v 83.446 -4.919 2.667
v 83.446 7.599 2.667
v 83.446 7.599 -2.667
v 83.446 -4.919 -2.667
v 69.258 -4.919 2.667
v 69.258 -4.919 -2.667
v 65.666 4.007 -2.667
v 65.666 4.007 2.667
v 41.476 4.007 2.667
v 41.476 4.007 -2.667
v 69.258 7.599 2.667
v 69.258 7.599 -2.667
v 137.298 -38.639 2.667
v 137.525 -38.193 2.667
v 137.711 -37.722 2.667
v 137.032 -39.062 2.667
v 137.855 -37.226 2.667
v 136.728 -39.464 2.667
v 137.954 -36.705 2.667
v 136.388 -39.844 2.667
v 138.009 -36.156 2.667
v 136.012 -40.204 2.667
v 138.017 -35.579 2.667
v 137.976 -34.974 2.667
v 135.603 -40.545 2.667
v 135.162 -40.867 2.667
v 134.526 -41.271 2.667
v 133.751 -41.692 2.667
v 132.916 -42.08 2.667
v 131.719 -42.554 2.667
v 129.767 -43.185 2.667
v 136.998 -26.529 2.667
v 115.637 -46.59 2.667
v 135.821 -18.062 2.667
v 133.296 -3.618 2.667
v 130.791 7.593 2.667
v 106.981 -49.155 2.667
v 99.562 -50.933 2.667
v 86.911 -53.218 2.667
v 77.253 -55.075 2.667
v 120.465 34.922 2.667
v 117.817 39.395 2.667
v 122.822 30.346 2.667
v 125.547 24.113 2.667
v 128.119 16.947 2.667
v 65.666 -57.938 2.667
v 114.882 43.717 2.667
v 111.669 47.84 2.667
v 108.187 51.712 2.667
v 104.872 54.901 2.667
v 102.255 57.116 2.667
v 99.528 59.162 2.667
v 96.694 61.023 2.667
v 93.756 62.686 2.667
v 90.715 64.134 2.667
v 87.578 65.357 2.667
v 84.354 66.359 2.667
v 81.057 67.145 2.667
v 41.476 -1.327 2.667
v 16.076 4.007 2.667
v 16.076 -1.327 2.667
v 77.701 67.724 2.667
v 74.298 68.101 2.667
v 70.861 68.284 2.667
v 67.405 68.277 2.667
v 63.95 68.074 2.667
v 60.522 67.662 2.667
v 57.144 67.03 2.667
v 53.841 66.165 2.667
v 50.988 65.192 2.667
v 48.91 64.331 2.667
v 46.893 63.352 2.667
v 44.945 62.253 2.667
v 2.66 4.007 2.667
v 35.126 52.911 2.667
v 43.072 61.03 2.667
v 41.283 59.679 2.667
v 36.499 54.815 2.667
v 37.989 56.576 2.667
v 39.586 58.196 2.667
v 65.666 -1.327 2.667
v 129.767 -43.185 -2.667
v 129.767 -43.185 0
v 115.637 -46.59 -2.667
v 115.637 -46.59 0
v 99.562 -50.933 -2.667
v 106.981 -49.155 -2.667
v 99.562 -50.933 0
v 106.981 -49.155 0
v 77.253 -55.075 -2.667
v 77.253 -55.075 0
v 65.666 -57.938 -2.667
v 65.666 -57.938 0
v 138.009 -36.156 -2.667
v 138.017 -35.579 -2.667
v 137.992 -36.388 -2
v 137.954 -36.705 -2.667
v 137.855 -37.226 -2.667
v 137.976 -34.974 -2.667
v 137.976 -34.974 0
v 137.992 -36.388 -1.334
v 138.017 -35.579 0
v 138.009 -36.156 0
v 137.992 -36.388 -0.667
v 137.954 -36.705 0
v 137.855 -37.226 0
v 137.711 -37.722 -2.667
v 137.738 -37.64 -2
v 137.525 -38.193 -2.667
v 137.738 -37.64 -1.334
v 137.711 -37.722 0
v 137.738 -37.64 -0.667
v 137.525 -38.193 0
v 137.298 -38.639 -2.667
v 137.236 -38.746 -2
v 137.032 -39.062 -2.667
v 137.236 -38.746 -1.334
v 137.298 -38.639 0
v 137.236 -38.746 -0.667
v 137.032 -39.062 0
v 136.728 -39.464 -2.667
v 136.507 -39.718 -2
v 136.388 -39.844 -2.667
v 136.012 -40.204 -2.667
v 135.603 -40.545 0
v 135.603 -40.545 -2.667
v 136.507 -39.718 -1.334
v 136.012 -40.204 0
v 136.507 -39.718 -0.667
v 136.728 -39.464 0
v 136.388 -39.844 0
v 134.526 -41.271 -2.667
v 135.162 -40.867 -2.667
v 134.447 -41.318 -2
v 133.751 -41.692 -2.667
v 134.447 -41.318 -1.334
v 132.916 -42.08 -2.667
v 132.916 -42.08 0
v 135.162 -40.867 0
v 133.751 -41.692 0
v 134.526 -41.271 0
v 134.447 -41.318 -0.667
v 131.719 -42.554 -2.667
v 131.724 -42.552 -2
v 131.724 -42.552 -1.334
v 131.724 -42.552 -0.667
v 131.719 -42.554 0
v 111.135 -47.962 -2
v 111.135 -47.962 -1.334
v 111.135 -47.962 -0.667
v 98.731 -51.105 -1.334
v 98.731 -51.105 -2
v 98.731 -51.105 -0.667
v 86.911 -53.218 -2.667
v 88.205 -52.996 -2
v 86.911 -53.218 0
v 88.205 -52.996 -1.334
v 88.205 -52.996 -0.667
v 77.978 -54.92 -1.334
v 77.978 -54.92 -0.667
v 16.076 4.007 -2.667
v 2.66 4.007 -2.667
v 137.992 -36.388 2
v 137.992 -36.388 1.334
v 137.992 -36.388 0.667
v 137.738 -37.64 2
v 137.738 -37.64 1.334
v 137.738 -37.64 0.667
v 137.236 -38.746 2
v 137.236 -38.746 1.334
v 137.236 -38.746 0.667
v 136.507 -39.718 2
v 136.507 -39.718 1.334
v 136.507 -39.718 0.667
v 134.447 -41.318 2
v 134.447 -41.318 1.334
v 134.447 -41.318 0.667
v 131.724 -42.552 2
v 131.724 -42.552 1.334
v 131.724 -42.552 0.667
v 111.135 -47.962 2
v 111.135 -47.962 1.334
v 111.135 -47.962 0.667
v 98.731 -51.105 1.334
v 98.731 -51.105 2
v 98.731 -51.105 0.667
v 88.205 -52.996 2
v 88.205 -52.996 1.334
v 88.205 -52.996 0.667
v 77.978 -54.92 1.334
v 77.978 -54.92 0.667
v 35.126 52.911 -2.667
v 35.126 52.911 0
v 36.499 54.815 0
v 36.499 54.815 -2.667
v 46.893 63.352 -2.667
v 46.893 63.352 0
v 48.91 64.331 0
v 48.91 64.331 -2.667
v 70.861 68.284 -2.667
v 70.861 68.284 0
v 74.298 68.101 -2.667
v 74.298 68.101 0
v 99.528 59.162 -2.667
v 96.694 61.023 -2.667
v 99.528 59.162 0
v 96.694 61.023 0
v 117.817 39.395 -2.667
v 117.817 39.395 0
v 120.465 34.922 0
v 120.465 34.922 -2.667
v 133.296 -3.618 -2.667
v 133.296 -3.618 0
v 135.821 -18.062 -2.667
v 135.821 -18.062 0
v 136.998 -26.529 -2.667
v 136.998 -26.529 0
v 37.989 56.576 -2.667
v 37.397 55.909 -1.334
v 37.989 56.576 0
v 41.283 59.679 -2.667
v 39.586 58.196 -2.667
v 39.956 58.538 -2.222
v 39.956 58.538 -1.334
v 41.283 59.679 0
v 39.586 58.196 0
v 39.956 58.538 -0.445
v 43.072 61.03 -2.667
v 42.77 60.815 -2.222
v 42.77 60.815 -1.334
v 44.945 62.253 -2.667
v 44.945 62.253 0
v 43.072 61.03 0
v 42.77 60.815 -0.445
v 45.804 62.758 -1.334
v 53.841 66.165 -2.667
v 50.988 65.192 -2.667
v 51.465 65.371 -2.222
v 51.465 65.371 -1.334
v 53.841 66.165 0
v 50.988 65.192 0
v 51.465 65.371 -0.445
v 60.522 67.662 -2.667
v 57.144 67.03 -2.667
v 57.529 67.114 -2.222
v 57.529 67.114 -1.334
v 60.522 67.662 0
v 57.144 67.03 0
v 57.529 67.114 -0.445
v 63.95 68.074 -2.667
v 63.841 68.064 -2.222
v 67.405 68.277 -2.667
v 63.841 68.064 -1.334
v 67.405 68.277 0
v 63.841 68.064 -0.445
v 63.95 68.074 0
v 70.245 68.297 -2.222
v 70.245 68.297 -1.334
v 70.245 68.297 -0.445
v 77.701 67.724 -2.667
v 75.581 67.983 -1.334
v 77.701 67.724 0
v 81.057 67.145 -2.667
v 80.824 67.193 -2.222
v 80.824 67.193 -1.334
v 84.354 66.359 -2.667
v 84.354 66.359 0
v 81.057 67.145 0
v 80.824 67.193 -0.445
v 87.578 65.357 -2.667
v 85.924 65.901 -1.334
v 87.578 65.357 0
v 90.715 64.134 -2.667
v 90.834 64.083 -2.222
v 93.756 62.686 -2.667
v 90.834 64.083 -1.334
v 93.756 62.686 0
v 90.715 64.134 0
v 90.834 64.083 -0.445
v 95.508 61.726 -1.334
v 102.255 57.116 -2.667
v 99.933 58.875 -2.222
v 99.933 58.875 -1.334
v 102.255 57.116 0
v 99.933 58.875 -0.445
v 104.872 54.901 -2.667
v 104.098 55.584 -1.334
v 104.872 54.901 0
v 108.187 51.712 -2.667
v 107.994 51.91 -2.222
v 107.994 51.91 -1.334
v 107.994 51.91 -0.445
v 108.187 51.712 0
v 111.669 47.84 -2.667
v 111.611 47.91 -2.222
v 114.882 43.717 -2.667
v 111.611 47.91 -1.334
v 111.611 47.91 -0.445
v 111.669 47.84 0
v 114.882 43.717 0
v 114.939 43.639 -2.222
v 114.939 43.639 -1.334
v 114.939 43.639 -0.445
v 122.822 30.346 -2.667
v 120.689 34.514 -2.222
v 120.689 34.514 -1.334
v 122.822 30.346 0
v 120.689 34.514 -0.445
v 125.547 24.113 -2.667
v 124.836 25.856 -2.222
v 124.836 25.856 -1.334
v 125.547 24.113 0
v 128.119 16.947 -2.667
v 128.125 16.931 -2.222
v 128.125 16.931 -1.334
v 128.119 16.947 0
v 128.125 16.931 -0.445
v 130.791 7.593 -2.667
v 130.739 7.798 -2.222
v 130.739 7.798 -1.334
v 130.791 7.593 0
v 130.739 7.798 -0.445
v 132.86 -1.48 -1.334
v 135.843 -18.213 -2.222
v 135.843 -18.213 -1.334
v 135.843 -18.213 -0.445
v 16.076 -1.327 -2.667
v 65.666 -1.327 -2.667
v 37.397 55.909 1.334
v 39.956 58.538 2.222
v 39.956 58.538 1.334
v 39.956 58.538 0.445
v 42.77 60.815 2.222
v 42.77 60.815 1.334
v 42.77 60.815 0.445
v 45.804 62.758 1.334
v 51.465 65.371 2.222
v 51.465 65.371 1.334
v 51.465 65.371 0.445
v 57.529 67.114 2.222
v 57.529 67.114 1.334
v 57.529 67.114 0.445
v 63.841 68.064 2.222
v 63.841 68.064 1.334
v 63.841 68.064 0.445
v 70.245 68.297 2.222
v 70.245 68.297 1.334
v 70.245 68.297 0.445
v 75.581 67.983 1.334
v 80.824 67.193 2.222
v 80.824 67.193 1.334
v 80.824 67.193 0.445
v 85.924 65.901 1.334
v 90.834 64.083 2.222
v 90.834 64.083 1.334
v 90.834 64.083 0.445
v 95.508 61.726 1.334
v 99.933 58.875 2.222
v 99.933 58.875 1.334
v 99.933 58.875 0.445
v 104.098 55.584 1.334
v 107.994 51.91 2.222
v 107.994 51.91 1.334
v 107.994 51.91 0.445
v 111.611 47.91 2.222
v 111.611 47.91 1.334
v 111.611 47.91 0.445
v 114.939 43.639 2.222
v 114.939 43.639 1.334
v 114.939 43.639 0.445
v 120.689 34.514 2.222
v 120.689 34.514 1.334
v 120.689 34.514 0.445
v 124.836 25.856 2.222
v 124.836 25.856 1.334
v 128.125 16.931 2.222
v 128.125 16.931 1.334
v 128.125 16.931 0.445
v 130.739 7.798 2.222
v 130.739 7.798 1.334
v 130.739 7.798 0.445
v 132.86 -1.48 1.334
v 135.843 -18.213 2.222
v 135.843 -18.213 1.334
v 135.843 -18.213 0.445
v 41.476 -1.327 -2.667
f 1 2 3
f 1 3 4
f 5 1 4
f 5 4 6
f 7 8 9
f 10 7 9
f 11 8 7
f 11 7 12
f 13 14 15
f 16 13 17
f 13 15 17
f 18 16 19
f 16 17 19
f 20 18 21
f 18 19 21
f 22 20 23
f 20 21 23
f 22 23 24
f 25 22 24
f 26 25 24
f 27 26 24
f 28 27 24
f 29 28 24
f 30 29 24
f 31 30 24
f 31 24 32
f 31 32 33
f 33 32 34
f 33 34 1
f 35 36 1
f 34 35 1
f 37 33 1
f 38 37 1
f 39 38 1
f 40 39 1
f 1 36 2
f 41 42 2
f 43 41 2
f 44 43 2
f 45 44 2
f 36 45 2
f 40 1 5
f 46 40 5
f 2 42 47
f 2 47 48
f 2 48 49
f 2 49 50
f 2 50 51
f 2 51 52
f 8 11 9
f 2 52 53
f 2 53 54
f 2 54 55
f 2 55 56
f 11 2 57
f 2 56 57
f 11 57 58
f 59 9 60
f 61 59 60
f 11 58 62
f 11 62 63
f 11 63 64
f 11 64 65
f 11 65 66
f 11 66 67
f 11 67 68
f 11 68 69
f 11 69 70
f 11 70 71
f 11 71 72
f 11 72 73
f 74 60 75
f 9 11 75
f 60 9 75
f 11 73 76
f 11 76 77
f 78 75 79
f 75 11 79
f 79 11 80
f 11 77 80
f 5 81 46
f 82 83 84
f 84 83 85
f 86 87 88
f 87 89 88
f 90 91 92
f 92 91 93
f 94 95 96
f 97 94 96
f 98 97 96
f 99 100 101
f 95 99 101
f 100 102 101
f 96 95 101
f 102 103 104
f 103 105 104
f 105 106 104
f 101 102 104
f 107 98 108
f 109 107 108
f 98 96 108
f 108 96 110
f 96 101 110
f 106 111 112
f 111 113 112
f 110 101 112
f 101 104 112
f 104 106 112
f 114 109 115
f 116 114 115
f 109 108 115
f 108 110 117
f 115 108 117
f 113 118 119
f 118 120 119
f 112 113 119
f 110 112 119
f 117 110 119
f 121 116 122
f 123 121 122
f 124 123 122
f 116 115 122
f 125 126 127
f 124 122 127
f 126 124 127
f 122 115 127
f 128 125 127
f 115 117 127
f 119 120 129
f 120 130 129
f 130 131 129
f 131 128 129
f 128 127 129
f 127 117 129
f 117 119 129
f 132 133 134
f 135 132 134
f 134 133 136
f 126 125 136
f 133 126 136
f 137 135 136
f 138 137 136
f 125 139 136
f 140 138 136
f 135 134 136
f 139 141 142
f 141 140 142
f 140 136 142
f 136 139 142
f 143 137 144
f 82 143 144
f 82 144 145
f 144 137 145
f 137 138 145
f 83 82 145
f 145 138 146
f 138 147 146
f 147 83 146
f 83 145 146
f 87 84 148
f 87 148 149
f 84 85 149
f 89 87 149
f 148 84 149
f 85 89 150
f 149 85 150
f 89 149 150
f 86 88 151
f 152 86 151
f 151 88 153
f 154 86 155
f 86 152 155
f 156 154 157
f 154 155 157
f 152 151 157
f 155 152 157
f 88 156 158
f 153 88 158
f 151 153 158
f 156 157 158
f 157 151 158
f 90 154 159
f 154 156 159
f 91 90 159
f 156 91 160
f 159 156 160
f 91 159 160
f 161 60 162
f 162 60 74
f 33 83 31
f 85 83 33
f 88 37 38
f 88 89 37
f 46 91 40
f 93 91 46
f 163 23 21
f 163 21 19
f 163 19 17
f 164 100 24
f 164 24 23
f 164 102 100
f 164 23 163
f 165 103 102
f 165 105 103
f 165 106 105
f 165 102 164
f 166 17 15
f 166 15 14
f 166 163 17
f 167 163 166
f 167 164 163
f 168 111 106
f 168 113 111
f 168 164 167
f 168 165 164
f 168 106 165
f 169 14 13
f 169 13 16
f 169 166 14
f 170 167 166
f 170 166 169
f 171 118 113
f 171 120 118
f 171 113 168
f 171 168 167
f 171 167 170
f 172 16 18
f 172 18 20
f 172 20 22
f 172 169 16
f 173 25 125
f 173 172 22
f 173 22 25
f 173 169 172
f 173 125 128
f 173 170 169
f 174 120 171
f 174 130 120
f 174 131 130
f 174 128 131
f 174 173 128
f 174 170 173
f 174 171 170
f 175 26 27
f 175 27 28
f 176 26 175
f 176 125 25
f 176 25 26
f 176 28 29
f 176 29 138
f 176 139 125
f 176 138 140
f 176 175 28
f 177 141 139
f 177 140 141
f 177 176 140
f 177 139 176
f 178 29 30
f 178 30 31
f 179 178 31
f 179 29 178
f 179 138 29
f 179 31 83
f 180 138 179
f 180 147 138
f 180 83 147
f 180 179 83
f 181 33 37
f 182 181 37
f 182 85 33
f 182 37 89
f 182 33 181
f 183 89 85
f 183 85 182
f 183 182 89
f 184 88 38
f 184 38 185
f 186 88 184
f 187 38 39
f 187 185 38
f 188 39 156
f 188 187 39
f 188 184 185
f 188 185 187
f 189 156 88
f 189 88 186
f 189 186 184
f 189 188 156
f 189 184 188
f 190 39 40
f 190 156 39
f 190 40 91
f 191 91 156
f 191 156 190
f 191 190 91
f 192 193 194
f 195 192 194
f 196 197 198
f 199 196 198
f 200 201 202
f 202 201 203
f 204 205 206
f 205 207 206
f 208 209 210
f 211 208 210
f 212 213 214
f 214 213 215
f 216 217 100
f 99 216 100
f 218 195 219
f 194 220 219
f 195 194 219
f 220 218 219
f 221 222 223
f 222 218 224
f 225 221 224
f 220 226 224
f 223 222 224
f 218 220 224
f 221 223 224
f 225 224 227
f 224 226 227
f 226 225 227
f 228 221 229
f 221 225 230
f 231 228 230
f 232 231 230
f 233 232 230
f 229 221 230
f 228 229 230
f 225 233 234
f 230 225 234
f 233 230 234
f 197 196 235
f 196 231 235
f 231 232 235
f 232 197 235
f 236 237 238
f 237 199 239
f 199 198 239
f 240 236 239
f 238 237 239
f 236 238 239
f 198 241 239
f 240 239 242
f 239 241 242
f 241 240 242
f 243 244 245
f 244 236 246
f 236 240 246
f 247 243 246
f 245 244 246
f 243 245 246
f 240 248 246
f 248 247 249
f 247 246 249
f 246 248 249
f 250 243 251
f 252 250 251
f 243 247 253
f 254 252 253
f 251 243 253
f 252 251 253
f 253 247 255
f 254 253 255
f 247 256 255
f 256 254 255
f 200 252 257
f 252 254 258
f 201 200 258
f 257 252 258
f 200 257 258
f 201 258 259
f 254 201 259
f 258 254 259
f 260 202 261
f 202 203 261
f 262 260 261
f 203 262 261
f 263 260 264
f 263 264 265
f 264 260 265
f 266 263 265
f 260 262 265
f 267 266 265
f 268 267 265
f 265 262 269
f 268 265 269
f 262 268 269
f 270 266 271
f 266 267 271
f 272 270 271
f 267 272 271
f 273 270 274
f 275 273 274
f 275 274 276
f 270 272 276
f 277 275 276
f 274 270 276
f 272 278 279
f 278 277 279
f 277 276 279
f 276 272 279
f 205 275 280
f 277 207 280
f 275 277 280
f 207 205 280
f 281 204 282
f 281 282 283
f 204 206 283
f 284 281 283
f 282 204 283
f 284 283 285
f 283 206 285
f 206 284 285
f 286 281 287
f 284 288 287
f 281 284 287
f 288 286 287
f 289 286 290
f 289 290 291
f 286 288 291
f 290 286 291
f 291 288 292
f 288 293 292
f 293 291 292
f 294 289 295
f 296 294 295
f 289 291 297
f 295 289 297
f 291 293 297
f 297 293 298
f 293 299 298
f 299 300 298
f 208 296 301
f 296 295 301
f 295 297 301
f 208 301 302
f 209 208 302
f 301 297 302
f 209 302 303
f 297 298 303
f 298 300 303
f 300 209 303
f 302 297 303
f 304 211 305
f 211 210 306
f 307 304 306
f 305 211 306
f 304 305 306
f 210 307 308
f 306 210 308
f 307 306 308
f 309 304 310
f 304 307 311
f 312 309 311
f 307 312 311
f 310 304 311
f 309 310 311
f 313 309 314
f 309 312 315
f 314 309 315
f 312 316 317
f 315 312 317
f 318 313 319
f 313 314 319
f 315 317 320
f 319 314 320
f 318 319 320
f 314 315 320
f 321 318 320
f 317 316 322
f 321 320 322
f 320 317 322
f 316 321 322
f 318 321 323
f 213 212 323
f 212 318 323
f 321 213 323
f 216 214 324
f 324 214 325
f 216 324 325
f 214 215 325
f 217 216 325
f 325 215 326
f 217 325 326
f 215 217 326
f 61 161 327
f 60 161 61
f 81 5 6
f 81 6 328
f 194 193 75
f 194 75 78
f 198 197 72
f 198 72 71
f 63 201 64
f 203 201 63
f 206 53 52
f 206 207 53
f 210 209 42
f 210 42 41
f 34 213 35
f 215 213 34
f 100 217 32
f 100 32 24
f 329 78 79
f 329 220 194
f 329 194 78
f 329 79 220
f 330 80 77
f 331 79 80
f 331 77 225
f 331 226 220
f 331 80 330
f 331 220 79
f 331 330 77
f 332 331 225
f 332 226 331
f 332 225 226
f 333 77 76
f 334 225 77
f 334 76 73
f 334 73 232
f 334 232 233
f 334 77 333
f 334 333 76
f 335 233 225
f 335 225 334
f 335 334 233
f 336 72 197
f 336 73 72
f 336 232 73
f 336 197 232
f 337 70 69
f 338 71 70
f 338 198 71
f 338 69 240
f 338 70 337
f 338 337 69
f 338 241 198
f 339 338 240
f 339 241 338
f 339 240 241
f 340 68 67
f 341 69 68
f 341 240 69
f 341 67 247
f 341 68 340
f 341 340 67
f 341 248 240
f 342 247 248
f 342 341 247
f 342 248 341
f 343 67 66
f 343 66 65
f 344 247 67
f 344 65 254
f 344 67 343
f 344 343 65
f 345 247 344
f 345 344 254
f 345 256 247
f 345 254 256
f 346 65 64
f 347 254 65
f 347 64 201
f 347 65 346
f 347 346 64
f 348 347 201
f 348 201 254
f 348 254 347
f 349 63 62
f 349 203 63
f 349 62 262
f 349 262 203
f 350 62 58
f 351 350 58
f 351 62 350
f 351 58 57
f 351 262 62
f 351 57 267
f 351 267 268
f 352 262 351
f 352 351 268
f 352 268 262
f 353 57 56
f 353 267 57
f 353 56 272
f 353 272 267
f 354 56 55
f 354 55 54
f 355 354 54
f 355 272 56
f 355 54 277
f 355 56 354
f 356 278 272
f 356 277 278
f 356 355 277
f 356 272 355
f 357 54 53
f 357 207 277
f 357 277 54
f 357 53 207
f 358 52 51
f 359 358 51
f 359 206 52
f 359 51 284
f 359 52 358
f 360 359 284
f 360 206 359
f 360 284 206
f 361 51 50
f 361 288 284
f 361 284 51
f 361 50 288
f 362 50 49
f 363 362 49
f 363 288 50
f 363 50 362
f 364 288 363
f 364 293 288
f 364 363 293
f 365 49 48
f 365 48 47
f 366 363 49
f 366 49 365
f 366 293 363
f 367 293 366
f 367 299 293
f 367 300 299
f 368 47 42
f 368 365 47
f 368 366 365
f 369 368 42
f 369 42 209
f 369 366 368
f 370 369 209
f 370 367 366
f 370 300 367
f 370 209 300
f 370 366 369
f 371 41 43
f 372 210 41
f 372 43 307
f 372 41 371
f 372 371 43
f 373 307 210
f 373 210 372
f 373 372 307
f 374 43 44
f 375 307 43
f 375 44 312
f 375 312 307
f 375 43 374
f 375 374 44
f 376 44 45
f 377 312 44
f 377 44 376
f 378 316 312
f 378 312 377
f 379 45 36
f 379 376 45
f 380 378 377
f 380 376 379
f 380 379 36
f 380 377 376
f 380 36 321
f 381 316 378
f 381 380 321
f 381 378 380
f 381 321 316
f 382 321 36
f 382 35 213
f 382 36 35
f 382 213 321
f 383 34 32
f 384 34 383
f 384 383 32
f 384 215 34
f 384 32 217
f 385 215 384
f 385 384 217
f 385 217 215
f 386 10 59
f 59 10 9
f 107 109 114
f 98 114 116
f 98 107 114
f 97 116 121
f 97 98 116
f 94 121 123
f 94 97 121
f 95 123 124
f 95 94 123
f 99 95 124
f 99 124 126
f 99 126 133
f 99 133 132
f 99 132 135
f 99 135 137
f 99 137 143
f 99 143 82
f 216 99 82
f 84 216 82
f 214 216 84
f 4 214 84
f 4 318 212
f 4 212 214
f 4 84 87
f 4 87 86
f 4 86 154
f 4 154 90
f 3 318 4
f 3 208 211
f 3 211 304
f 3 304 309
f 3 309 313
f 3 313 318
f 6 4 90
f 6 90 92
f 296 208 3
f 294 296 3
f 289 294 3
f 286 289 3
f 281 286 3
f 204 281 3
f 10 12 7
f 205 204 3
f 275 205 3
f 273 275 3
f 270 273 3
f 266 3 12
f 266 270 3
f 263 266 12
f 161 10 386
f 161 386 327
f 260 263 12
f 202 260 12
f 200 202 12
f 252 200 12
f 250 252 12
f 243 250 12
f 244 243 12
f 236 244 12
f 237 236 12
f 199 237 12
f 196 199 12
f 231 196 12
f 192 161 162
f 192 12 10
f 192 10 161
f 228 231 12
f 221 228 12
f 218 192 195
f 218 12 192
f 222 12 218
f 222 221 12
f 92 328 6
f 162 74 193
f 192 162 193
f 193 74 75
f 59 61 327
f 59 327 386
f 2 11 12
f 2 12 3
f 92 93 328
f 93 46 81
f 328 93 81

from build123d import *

# Parameters (mm, degrees)
BOSS_EXTRUDE1_DEPTH       = 2.667
SKETCH2_W                 = 25.4
SKETCH2_H                 = 5.334
ELEVATOR_TAB_DEPTH        = 5.334
ELEVATOR_THROW_SLOT_REACH = 7.334


with BuildPart() as part:
    # Sketch1 → Boss-Extrude1 (new body, symmetric)
    with BuildSketch(Plane.XY):
        with BuildLine():
            Line((2.660102258, 4.006979402), (35.125661289, 52.910673204))
            add(Edge.make_bspline(
                [(35.125661289, 52.910673204), (37.94742964, 57.161174336), (47.971102481, 65.942329117), (69.008437841, 69.751744098), (98.507626417, 64.241187451), (123.102162867, 36.688590277), (133.317484482, 0.065110923), (136.807881475, -23.842980811), (137.976029916, -34.973623487)],
                knots=[0, 0, 0, 0, 0.083245033, 0.226858925, 0.34728898, 0.588091299, 0.805835078, 1, 1, 1, 1], degree=3))
            add(Edge.make_bspline(
                [(137.976029916, -34.973623487), (138.815150475, -42.969140814), (124.639937031, -43.609481638), (103.232724243, -50.579998556), (88.627971228, -52.80632971), (74.994048295, -55.361665029), (65.666068366, -57.937752933)],
                knots=[0, 0, 0, 0, 0.302584462, 0.371889792, 0.693053295, 1, 1, 1, 1], degree=3))
            Line((65.666068366, -57.937752933), (65.666068366, 0))
            Line((65.666068366, 0), (65.666068366, 4.006979402))
            Line((65.666068366, 4.006979402), (2.660102258, 4.006979402))
        make_face()
    extrude(amount=BOSS_EXTRUDE1_DEPTH, both=True)

    # Sketch2 → Elevator Tab (add)
    with BuildSketch(Plane.XZ.offset(-4.006979402)):
        with Locations((28.775764126, 0)):
            Rectangle(SKETCH2_W, SKETCH2_H)
    extrude(amount=ELEVATOR_TAB_DEPTH)

    # Sketch3 → Elevator Throw Slot (cut, up to next)
    with BuildSketch(Plane.XY.offset(2.667), mode=Mode.PRIVATE) as elevator_throw_slot_sk1:
        Polygon((65.666068366, 4.006979402), (69.258170815, 7.599081851), (83.446068366, 7.599081851), (83.446068366, -4.919123046), (69.258170815, -4.919123046), (65.666068366, -1.327020598), align=None)
    elevator_throw_slot_tool1 = extrude(elevator_throw_slot_sk1.sketch, amount=-ELEVATOR_THROW_SLOT_REACH, mode=Mode.PRIVATE) & part.part
    add(elevator_throw_slot_tool1.solids().sort_by_distance((75.029476, 1.339979, 2.667))[0], mode=Mode.SUBTRACT)


solid = part.part
